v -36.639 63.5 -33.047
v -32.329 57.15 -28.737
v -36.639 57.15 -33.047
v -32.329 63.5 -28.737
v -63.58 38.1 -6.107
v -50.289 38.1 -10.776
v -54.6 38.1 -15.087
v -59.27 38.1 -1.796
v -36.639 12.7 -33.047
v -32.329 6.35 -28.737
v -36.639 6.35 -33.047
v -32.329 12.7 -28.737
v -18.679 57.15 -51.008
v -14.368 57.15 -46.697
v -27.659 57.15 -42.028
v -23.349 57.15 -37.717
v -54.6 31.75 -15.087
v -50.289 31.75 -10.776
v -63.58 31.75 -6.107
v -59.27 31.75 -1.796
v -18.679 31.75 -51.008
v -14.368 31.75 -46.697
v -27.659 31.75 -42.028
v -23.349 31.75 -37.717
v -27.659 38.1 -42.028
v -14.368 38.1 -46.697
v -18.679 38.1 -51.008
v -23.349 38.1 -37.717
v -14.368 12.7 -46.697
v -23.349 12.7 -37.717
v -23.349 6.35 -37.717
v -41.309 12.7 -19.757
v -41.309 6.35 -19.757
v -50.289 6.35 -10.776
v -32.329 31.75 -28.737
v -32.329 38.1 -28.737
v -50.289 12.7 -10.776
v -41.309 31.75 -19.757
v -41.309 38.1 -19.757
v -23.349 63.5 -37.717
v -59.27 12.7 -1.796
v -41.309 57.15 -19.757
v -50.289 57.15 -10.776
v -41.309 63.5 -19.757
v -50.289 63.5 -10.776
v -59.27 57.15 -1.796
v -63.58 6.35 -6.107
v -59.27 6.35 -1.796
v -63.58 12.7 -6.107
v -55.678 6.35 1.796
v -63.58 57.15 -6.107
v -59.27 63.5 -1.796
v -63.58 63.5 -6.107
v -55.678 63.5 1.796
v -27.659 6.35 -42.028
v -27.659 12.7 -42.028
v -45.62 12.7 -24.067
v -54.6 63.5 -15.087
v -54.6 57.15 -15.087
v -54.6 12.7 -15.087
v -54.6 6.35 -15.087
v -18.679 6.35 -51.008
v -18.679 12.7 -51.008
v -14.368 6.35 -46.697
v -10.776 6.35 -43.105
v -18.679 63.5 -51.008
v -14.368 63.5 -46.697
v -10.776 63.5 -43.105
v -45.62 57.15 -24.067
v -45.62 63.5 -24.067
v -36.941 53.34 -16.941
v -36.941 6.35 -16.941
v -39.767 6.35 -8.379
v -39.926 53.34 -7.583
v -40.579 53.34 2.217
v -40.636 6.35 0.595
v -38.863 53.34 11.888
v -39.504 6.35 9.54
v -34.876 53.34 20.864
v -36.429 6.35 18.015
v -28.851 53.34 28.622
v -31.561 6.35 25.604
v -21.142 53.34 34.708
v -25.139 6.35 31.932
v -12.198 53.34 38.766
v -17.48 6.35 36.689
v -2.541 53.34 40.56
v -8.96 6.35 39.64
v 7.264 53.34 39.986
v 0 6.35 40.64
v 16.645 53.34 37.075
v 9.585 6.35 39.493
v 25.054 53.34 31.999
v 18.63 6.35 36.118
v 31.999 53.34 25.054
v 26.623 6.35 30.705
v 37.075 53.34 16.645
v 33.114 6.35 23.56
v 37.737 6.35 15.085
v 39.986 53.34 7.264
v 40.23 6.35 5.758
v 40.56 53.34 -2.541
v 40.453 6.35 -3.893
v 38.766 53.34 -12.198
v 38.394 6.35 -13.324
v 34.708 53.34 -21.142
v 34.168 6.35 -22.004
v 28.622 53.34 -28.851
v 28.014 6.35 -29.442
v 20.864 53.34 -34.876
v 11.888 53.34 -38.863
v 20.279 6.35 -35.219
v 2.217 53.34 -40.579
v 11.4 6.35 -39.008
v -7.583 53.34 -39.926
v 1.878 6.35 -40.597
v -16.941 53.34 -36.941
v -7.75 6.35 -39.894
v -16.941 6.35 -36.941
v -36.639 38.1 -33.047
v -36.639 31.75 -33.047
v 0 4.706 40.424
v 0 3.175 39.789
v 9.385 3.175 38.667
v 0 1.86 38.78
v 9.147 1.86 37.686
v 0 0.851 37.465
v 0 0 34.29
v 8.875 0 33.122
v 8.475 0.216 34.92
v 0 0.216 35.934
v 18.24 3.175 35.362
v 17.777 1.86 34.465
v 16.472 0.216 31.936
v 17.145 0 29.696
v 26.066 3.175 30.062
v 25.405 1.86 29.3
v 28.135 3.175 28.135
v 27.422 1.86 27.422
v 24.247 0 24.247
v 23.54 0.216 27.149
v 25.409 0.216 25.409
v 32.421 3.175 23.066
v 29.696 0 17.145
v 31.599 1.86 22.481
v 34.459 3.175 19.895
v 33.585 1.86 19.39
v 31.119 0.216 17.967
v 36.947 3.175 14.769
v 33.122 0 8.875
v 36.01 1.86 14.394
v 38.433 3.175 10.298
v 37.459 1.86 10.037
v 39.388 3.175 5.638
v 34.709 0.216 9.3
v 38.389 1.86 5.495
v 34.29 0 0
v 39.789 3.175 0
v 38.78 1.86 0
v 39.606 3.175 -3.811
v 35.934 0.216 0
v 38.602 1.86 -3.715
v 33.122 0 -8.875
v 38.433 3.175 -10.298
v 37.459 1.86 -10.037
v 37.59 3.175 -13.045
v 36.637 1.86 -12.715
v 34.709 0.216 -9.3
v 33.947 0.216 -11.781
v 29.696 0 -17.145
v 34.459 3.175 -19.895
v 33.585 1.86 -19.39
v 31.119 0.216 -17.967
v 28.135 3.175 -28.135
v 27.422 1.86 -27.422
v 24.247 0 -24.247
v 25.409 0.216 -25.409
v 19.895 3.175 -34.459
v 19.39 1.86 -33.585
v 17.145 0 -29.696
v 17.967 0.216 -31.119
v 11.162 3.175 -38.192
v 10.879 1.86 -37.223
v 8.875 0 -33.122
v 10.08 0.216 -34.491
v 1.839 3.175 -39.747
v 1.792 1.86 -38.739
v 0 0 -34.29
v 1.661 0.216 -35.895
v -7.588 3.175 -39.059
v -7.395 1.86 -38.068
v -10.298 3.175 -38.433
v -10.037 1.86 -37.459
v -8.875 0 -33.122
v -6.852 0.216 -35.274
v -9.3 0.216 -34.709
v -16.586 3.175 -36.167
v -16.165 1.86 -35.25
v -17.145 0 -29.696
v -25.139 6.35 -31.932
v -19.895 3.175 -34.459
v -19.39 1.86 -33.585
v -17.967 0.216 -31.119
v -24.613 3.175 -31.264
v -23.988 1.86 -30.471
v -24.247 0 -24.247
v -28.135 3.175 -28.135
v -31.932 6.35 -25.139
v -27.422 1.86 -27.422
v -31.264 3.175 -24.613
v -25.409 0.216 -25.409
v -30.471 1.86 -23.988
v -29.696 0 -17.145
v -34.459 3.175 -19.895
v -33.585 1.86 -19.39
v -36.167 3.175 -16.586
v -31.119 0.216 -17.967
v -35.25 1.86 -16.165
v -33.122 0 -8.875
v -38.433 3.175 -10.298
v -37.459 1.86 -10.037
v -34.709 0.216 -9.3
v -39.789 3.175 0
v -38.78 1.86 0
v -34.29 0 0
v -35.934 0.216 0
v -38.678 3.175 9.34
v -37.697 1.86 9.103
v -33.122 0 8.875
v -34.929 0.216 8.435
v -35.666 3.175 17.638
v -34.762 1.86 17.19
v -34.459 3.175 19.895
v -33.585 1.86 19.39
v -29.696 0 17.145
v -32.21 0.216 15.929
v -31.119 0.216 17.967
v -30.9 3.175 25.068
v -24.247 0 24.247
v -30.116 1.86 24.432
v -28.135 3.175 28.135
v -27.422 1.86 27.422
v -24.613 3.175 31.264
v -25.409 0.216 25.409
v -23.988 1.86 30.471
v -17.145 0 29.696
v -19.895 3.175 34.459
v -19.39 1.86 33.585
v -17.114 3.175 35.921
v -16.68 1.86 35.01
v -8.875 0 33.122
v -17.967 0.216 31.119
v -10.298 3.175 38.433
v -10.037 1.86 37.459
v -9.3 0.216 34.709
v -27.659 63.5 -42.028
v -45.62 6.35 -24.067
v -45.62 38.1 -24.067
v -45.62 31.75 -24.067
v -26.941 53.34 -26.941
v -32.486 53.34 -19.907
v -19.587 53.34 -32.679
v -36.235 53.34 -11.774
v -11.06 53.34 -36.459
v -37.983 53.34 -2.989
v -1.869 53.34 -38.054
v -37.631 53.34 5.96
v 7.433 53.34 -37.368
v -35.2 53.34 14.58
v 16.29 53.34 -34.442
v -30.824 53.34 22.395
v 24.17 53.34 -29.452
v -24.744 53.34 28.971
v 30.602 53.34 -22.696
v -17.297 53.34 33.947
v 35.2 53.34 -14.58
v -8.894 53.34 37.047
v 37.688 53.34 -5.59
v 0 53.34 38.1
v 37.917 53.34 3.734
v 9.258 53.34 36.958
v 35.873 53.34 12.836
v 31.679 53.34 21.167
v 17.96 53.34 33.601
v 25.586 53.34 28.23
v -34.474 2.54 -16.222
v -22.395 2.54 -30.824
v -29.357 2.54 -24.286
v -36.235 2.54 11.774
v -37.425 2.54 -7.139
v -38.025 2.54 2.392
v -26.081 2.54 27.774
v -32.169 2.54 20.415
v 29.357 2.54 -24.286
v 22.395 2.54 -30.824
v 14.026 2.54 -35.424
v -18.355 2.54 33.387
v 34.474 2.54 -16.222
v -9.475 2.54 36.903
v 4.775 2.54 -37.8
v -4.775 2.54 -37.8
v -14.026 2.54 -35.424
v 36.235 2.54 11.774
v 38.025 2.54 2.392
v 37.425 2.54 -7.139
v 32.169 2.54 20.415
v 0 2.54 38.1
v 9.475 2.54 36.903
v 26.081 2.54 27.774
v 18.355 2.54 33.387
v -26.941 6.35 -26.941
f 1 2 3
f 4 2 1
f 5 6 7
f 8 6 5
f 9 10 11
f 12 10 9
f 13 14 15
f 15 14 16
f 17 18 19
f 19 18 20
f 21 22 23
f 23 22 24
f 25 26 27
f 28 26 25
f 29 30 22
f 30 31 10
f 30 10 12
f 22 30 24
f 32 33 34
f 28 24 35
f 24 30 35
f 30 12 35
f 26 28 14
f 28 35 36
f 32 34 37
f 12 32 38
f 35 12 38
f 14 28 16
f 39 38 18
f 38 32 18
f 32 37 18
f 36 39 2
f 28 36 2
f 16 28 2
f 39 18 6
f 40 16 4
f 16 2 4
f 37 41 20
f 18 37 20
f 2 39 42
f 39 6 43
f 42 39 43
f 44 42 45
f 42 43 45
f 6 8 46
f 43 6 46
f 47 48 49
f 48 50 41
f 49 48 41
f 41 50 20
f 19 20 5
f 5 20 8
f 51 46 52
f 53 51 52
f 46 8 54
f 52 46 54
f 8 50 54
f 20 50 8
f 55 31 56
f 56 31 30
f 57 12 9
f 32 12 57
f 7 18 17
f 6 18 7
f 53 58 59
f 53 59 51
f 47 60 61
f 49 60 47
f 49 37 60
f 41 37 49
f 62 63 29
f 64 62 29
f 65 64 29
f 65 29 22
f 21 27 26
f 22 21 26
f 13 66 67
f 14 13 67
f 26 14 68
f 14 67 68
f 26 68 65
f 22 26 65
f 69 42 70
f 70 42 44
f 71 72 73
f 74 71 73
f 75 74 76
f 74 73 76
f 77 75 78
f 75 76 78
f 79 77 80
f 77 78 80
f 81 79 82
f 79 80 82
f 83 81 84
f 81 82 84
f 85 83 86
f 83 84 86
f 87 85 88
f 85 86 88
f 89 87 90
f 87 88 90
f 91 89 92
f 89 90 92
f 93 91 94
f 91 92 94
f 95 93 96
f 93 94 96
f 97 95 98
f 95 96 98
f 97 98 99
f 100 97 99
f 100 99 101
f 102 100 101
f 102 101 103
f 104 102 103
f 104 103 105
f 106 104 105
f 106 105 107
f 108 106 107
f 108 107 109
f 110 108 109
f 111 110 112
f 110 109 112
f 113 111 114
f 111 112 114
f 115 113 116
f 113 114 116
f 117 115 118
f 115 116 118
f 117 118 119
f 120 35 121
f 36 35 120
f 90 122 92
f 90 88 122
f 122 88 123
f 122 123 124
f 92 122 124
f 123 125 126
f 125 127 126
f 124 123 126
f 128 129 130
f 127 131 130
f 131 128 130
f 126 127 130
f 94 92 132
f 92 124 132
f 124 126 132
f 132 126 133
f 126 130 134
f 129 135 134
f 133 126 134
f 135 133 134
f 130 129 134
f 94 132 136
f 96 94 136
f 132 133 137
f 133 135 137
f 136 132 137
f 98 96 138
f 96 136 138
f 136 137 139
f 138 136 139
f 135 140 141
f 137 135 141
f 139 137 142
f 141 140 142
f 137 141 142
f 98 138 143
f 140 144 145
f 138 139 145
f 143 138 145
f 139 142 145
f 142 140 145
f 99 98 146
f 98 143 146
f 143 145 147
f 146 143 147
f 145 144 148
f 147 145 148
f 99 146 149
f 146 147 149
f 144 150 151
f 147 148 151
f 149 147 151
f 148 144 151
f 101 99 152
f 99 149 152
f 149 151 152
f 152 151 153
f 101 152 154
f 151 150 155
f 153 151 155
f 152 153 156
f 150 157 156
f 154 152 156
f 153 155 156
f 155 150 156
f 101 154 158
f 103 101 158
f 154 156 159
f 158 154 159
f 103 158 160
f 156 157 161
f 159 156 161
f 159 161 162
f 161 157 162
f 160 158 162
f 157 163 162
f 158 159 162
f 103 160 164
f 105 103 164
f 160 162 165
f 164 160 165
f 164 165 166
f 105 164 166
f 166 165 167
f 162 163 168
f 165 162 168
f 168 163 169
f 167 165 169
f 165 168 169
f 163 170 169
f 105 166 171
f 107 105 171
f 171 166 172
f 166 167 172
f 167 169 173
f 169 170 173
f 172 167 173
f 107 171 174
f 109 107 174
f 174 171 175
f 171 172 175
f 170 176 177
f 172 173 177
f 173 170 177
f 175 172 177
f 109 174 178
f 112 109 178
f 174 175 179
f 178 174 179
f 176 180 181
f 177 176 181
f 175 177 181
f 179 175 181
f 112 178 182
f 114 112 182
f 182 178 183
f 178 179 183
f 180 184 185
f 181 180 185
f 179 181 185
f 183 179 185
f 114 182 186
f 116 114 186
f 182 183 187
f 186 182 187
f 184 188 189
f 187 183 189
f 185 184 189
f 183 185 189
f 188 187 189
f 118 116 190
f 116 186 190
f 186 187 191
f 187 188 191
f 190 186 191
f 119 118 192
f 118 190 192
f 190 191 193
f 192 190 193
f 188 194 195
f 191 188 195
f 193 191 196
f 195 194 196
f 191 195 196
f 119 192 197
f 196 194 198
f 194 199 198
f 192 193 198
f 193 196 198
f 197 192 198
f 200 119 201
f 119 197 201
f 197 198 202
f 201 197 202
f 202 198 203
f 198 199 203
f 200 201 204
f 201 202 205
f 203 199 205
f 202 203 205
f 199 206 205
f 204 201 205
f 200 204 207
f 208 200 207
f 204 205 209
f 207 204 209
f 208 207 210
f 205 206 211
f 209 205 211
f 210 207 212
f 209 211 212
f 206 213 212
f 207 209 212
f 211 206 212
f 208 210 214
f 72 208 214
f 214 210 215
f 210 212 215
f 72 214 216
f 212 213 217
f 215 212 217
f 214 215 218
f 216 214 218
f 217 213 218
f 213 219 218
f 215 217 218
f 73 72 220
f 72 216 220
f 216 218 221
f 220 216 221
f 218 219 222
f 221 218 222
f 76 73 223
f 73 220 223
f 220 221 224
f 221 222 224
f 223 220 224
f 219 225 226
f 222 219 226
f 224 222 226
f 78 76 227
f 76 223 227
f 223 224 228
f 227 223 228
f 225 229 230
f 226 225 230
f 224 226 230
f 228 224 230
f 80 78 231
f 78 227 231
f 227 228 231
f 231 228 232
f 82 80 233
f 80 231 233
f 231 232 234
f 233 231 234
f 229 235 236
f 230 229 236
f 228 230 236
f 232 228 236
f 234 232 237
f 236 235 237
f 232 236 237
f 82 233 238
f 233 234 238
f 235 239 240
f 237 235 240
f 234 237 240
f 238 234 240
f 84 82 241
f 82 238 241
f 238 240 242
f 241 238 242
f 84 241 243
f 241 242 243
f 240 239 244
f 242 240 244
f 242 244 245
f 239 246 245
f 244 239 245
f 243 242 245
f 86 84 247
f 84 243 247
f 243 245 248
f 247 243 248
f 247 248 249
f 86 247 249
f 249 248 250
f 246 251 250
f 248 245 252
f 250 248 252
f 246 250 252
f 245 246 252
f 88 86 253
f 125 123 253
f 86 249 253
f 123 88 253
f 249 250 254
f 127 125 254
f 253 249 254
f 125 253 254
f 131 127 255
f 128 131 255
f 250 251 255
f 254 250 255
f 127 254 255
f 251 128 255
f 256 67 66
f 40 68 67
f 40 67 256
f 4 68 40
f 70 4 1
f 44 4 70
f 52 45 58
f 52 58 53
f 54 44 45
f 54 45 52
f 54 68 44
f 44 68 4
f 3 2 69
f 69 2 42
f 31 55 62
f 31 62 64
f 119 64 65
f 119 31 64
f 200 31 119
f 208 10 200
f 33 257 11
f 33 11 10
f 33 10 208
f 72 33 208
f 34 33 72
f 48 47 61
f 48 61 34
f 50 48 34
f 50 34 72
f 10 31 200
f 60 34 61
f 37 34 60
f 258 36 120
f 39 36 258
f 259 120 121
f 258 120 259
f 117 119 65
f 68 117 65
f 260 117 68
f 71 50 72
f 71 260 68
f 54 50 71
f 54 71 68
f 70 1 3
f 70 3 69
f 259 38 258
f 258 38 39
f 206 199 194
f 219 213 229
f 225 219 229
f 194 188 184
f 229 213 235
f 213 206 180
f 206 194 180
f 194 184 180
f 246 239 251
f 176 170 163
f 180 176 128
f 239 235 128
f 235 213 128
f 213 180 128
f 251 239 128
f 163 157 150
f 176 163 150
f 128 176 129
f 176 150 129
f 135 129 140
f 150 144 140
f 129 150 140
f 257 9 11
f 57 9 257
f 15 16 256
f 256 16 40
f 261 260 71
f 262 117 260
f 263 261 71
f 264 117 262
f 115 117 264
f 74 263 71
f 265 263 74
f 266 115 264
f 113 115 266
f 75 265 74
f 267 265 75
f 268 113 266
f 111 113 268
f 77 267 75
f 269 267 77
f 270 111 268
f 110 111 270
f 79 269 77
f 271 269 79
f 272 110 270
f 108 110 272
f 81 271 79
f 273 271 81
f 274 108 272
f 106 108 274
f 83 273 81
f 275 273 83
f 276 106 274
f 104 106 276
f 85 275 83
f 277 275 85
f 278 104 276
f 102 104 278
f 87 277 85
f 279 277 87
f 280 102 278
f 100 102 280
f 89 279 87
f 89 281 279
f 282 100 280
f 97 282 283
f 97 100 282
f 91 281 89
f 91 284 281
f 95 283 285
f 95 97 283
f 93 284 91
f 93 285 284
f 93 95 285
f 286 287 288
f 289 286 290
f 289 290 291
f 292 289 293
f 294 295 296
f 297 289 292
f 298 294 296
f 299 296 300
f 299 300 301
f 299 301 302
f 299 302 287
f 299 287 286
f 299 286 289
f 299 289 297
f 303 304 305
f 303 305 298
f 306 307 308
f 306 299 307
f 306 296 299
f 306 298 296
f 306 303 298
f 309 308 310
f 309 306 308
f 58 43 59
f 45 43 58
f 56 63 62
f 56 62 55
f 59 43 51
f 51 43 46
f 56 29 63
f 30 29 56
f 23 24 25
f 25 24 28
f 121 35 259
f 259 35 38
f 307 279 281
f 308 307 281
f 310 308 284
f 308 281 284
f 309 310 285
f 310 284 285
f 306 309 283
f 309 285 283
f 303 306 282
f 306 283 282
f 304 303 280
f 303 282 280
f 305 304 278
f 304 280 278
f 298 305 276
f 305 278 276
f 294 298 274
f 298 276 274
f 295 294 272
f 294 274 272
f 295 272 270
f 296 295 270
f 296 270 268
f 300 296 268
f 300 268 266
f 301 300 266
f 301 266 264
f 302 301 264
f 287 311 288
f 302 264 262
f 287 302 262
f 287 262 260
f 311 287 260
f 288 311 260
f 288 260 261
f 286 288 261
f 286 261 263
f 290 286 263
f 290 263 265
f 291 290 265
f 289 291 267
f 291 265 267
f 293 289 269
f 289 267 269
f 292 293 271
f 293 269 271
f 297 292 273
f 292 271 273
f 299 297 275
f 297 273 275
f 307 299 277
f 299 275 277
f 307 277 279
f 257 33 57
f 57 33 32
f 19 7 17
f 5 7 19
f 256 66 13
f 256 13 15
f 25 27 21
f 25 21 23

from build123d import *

# Parameters (mm, degrees)
SKETCH1_R           = 40.64
BOSS_EXTRUDE1_DEPTH = 53.34
FILLET1_R           = 6.35
SKETCH2_R           = 38.1
CUT_EXTRUDE1_DEPTH  = 50.8
SKETCH7_W           = 5.08
SKETCH7_H           = 57.15
BOSS_EXTRUDE3_DEPTH = 63.5
SKETCH8_W           = 12.7
SKETCH8_H           = 6.35
BOSS_EXTRUDE4_DEPTH = 6.096


with BuildPart() as part:
    # Sketch1 → Boss-Extrude1 (new body)
    with BuildSketch(Plane(origin=(0, 0, 0), x_dir=(1, 0, 0), z_dir=(0, 1, 0))):
        with Locations(Location((0, 0, 0), (0, 0, 270))):
            Circle(SKETCH1_R)
    extrude(amount=BOSS_EXTRUDE1_DEPTH)

    # Fillet1
    fillet1_edges = [part.edges().sort_by_distance(p)[0] for p in [
        (0, 0, -40.64),
    ]]
    fillet(fillet1_edges, radius=FILLET1_R)

    # Sketch2 → Cut-Extrude1 (cut)
    with BuildSketch(Plane(origin=(0, 53.34, 0), x_dir=(1, 0, 0), z_dir=(0, 1, 0))):
        with Locations(Location((0, 0, 0), (0, 0, 270))):
            Circle(SKETCH2_R)
    extrude(amount=-CUT_EXTRUDE1_DEPTH, mode=Mode.SUBTRACT)



with BuildPart() as body_2:
    # Sketch7 → Boss-Extrude3 (new body)
    with BuildSketch(Plane(origin=(-28.736819587, 0, 28.736819587), x_dir=(0.7071067811865477, 0, 0.7071067811865475), z_dir=(-0.7071067811865475, 0, 0.7071067811865477))):
        with Locations((-40.64, 34.925)):
            Rectangle(SKETCH7_W, SKETCH7_H)
    extrude(amount=-BOSS_EXTRUDE3_DEPTH)


with BuildPart() as part_1:
    add(part.part)

    add(body_2.part)  # Boss-Extrude4 merges body 2
    # Sketch8 → Boss-Extrude4 (add)
    with BuildSketch(Plane(origin=(-30.532870812, 0, -30.532870812), x_dir=(-0.7071067811865474, 0, 0.7071067811865477), z_dir=(-0.7071067811865477, 0, -0.7071067811865474))):
        with Locations((34.29, 60.325)):
            Rectangle(SKETCH8_W, SKETCH8_H)
        with Locations((34.29, 34.925)):
            Rectangle(SKETCH8_W, SKETCH8_H)
        with Locations((8.89, 60.325)):
            Rectangle(SKETCH8_W, SKETCH8_H)
        with Locations((34.29, 9.525)):
            Rectangle(SKETCH8_W, SKETCH8_H)
        with Locations((8.89, 34.925)):
            Rectangle(SKETCH8_W, SKETCH8_H)
        with Locations((8.89, 9.525)):
            Rectangle(SKETCH8_W, SKETCH8_H)
        with Locations((-16.51, 60.325)):
            Rectangle(SKETCH8_W, SKETCH8_H)
        with Locations((-16.51, 34.925)):
            Rectangle(SKETCH8_W, SKETCH8_H)
        with Locations((-16.51, 9.525)):
            Rectangle(SKETCH8_W, SKETCH8_H)
    extrude(amount=BOSS_EXTRUDE4_DEPTH)


solid = part_1.part
